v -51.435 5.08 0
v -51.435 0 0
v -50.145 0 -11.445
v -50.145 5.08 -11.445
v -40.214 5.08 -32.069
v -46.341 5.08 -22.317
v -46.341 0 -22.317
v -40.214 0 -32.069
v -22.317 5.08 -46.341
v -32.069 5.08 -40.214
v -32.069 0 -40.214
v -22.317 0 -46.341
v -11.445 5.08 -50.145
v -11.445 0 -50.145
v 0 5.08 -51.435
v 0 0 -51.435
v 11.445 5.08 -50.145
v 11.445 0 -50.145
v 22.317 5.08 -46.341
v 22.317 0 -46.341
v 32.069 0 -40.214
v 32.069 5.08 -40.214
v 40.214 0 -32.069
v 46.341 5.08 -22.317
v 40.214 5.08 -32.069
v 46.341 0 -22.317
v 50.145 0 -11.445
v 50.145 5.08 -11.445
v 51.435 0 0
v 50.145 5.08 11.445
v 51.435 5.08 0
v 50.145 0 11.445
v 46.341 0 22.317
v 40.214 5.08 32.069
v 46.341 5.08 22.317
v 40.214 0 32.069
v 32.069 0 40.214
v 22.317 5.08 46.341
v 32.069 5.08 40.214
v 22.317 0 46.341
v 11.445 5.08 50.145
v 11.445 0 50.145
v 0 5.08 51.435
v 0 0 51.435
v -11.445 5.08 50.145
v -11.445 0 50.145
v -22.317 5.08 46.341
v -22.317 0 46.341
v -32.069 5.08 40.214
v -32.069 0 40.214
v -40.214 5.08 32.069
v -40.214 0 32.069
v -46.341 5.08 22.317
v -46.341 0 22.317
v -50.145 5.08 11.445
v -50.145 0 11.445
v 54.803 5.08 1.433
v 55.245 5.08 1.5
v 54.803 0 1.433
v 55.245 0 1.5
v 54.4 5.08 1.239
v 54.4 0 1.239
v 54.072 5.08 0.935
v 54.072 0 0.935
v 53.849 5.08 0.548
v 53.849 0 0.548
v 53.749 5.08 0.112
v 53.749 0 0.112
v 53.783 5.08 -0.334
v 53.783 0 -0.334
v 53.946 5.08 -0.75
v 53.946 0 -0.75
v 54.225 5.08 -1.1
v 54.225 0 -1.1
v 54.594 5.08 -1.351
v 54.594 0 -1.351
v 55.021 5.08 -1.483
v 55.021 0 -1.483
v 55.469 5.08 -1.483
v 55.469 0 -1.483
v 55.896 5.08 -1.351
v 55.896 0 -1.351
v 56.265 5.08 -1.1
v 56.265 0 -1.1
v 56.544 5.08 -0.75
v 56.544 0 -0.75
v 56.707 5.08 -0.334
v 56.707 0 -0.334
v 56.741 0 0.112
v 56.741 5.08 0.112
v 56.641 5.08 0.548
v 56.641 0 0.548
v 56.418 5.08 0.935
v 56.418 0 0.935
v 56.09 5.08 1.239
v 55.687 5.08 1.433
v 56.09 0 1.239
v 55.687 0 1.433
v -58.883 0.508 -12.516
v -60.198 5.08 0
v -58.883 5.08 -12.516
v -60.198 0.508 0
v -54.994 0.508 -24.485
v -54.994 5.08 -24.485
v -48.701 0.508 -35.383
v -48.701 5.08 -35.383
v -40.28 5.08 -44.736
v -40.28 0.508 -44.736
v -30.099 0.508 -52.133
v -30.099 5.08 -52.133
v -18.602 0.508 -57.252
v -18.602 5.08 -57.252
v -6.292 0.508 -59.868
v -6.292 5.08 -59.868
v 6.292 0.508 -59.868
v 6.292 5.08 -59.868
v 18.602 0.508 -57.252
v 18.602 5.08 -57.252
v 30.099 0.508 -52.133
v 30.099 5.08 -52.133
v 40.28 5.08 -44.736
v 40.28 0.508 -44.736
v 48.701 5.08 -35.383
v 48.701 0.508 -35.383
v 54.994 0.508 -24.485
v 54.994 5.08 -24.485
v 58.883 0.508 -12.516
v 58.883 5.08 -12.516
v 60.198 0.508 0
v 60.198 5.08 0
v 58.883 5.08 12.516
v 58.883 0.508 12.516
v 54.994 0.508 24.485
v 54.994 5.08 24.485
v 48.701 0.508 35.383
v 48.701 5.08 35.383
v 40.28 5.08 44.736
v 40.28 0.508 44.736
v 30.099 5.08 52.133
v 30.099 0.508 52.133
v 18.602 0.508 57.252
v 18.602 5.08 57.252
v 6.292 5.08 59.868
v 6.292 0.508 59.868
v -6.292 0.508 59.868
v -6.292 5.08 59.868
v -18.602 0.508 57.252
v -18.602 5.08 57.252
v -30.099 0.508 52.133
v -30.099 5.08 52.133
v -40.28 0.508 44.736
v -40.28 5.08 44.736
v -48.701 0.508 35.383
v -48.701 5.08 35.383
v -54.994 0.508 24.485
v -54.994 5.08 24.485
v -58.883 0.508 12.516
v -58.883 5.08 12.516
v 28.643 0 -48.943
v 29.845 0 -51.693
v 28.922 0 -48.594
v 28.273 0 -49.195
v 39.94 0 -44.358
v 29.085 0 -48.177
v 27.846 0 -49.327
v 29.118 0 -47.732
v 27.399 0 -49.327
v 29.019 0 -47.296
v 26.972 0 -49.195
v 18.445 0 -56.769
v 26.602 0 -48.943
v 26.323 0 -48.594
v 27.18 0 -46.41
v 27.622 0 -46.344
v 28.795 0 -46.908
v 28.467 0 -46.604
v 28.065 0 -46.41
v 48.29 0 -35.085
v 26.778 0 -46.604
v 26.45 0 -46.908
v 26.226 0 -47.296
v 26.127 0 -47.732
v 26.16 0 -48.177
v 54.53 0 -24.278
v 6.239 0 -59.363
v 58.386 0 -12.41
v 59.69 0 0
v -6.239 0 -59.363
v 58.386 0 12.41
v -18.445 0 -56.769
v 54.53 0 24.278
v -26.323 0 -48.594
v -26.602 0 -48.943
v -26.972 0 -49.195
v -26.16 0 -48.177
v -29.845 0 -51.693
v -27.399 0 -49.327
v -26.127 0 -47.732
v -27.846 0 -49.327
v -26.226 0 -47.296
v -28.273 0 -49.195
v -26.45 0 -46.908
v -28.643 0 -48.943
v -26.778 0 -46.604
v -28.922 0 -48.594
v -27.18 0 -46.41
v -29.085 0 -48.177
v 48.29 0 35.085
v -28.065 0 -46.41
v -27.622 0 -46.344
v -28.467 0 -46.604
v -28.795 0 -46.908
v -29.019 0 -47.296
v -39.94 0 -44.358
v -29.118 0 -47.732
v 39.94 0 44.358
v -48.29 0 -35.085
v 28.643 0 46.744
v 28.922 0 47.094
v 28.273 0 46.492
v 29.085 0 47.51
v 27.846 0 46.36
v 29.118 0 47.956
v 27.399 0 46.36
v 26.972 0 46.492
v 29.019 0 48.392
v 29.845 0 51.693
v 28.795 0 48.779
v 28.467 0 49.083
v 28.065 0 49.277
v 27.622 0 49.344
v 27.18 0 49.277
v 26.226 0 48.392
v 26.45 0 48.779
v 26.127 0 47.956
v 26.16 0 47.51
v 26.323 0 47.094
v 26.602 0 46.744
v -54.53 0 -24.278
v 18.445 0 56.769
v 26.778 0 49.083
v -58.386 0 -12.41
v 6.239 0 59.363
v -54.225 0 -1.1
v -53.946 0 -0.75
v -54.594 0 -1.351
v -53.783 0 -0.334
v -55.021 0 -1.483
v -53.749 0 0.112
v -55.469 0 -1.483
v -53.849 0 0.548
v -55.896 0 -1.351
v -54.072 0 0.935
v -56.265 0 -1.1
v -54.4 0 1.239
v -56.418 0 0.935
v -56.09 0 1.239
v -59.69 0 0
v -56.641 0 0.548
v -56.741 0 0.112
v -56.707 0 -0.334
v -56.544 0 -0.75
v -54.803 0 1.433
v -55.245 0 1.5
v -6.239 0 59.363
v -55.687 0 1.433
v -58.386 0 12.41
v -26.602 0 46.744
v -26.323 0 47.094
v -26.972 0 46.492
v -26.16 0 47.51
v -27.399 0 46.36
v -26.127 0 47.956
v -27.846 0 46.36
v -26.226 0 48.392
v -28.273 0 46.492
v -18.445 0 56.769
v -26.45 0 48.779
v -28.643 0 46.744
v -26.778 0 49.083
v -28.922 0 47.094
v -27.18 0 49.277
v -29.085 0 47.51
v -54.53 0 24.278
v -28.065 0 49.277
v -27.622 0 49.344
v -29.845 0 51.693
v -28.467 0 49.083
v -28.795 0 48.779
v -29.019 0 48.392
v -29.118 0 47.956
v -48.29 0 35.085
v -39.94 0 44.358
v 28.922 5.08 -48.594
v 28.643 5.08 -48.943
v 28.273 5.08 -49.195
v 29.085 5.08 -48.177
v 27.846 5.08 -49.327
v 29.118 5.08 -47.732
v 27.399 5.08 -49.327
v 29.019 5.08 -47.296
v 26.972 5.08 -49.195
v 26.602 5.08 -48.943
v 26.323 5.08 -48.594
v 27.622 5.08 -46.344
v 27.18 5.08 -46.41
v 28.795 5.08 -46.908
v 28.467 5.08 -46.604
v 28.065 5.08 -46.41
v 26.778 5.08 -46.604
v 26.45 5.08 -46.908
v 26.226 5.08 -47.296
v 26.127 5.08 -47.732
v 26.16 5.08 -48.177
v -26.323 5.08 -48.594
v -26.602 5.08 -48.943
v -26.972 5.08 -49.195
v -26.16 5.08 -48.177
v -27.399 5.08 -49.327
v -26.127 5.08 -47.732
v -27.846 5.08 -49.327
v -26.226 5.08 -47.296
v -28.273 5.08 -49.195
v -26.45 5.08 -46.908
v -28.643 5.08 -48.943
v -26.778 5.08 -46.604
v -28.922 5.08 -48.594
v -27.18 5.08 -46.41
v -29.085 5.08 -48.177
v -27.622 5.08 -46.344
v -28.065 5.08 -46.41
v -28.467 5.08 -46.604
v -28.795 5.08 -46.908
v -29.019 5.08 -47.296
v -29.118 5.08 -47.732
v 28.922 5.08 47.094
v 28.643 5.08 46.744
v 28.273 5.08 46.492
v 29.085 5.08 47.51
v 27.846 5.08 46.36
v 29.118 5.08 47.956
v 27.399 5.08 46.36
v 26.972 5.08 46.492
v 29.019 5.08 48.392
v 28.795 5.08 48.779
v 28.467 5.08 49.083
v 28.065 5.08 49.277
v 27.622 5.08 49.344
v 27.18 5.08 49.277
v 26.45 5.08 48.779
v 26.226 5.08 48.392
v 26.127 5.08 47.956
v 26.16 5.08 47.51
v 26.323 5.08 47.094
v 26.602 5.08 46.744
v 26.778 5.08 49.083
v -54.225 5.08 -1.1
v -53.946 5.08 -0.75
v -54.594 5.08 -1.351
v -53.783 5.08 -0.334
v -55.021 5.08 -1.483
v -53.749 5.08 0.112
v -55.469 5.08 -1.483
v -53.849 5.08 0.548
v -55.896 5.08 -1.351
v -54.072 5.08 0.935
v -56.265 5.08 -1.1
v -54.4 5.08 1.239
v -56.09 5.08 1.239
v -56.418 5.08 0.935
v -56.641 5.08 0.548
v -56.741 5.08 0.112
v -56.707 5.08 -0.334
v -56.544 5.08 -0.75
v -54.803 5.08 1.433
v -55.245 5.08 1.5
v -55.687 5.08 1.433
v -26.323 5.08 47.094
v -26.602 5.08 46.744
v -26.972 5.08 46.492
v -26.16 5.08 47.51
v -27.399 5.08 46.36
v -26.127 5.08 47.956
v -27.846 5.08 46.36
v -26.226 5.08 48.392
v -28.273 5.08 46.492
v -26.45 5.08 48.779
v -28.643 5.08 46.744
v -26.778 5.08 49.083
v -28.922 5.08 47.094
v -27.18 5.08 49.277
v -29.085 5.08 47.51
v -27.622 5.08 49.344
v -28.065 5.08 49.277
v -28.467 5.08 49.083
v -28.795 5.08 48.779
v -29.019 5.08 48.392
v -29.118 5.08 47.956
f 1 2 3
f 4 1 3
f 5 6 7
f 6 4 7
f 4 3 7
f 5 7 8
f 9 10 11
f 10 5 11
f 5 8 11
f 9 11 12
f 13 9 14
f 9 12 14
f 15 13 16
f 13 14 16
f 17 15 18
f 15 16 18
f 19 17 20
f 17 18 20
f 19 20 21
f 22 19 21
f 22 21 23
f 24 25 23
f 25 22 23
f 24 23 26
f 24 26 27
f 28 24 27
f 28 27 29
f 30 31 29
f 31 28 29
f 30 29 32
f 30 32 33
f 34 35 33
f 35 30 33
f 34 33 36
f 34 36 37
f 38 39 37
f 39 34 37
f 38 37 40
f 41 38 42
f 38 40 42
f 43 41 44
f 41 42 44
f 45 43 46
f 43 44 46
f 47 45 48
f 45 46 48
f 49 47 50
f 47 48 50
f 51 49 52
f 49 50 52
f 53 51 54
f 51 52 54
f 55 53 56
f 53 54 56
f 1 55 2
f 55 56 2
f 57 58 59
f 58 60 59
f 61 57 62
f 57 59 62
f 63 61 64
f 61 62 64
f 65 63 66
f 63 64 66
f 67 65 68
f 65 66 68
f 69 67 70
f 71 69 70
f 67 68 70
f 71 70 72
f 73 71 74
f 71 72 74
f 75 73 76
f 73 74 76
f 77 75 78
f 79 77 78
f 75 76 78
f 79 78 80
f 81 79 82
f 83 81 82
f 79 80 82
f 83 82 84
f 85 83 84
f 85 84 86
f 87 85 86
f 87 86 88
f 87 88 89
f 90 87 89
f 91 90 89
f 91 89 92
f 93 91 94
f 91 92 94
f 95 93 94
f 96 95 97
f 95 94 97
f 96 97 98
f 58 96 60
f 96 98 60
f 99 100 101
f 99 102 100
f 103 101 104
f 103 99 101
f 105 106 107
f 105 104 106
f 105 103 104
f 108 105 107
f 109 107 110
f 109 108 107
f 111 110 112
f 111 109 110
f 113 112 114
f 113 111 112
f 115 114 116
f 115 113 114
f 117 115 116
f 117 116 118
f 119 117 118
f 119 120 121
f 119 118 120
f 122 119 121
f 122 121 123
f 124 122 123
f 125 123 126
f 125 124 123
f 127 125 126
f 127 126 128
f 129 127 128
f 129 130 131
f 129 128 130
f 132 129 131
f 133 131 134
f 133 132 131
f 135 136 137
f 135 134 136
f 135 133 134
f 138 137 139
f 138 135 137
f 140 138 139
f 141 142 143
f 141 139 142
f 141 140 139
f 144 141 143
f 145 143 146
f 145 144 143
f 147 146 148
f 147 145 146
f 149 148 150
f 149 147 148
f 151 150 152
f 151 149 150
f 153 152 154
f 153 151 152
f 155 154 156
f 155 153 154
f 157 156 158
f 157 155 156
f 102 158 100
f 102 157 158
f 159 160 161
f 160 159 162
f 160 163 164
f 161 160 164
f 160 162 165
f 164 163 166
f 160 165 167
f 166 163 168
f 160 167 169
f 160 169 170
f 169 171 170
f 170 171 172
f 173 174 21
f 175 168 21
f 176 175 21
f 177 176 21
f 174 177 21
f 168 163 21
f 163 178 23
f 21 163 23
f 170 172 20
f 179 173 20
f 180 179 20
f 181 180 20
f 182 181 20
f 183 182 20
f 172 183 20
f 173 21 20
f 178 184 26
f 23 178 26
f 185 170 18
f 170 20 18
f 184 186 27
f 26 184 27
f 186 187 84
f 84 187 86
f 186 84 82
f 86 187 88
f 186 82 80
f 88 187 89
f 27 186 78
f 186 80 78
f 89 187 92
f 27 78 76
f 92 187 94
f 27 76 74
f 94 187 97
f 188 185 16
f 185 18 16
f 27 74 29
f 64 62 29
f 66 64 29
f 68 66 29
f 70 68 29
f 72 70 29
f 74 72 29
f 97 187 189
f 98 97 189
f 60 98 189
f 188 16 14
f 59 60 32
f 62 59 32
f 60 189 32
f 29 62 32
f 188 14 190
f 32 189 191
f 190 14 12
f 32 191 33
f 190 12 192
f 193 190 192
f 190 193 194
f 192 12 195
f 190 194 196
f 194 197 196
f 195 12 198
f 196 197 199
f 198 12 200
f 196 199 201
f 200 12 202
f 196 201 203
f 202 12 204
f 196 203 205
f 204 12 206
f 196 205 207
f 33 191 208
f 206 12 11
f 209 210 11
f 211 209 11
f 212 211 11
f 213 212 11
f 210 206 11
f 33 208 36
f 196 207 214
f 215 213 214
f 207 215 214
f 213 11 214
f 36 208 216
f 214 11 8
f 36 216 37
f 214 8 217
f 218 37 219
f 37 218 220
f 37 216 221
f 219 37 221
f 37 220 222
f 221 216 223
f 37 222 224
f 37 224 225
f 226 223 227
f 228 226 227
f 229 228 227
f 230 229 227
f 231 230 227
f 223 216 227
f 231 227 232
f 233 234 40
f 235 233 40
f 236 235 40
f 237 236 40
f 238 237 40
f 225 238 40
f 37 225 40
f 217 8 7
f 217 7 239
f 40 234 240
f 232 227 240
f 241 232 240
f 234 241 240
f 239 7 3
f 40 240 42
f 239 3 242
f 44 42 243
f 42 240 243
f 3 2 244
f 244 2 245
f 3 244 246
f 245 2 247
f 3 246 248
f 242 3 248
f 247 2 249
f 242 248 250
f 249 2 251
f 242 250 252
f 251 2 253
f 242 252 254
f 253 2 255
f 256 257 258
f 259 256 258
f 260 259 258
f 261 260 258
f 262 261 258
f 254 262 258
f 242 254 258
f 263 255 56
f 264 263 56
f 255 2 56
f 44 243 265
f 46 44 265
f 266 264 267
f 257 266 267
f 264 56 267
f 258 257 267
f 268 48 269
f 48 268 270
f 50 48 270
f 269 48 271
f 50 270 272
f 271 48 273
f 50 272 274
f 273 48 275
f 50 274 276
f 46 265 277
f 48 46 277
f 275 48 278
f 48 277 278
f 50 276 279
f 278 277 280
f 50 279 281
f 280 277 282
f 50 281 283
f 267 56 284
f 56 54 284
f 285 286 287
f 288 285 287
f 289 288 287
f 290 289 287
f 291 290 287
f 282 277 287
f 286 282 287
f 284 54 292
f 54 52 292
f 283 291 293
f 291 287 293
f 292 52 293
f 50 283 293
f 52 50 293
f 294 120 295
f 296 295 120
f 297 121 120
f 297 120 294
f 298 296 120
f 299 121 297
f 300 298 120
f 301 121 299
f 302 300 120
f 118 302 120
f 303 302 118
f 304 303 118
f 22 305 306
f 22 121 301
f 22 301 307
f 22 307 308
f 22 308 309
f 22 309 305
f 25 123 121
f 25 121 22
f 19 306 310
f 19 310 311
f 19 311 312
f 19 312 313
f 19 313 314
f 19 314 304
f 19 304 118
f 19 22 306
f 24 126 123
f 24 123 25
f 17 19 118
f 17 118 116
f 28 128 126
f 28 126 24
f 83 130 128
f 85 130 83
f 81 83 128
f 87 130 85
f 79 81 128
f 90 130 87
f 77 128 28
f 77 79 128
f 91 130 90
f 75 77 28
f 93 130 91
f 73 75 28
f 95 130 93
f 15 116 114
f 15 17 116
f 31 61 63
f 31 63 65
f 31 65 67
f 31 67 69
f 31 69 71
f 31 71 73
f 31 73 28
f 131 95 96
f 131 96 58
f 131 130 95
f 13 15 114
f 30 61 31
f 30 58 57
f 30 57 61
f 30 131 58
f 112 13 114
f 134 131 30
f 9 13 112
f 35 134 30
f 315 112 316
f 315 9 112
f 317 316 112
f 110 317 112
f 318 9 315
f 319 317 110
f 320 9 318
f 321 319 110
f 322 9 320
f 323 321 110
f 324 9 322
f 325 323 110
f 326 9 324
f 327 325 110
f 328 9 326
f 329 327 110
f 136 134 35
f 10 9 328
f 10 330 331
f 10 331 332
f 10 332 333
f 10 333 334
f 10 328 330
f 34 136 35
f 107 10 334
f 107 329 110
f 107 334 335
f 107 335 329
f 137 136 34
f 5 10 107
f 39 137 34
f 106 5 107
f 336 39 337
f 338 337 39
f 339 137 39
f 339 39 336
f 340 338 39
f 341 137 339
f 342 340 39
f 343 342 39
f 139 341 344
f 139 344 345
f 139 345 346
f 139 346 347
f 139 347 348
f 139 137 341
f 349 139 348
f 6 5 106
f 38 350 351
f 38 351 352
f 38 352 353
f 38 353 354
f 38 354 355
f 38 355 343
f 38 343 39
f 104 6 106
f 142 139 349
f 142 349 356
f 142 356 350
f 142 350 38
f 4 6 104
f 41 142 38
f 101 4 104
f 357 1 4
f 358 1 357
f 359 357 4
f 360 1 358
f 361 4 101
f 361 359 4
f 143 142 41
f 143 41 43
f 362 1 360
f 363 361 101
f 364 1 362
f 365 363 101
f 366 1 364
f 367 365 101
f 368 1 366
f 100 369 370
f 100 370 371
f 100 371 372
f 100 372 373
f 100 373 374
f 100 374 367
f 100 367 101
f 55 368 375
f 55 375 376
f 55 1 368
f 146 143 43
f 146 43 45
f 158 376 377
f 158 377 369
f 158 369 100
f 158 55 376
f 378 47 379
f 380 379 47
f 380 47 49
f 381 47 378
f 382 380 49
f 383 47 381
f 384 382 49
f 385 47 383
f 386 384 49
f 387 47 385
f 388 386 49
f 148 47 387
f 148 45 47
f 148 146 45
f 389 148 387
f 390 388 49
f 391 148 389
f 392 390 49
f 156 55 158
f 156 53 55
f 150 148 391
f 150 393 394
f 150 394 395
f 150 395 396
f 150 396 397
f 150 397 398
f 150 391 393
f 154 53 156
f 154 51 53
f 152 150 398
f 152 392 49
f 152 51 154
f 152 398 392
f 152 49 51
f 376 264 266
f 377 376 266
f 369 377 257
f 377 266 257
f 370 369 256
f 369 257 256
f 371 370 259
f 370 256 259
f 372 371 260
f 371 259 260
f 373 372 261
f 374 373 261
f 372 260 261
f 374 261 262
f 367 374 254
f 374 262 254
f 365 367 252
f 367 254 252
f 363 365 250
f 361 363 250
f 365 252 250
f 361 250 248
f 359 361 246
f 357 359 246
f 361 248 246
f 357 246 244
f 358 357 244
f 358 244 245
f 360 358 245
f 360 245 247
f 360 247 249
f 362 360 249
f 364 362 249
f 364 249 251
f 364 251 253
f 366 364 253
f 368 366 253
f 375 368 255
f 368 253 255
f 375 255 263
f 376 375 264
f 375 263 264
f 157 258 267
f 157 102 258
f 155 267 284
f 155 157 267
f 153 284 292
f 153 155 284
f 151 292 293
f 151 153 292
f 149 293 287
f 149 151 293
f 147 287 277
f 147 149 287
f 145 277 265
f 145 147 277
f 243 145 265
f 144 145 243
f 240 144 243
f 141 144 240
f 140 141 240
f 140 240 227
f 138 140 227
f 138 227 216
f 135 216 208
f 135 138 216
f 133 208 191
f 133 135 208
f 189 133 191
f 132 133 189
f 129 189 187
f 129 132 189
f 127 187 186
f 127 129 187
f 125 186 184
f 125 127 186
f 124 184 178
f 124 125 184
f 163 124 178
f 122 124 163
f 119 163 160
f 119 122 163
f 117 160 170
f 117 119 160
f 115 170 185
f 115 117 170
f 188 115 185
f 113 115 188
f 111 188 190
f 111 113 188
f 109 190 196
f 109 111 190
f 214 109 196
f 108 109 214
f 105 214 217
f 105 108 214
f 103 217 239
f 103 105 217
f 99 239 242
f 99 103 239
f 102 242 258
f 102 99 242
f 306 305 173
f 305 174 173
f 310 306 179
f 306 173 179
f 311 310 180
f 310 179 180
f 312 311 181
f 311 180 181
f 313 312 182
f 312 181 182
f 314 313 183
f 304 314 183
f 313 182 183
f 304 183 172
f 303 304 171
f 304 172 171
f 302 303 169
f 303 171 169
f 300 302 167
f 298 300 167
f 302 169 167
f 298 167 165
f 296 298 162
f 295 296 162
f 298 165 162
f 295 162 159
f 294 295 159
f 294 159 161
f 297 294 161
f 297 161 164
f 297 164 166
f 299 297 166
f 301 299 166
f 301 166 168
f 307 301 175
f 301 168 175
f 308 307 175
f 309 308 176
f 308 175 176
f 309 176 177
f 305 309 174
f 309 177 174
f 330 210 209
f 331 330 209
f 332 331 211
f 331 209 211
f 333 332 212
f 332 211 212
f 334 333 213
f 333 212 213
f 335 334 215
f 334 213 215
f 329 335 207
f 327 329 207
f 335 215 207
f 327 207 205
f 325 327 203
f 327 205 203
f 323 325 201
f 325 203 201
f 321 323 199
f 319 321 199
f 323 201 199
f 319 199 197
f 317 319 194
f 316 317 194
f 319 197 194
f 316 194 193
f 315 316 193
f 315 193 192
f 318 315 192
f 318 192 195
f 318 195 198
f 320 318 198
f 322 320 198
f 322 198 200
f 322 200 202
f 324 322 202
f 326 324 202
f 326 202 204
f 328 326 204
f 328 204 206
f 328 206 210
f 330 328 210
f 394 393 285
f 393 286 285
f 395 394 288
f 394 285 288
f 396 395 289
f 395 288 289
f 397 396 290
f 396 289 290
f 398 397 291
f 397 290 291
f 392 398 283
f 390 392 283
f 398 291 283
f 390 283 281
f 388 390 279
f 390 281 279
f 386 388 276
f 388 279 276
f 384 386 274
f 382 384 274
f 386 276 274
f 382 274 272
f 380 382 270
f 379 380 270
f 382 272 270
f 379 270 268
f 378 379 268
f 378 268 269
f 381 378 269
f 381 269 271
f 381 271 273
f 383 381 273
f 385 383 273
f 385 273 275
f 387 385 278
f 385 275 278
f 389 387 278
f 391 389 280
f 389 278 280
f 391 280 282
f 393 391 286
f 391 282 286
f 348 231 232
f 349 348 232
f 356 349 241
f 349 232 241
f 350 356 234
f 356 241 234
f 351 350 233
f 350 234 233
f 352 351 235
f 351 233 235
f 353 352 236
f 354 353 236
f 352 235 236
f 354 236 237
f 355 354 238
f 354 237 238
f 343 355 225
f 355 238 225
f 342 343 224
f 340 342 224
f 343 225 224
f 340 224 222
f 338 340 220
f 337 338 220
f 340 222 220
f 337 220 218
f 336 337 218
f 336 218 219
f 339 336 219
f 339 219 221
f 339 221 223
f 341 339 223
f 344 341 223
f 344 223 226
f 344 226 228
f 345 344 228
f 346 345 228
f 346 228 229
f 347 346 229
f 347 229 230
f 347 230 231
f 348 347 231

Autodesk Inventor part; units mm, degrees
ref_plane "YZ Plane" through (0, 0, 0) normal (1, 0, 0) x (0, 1, 0)
ref_plane "XZ Plane" through (0, 0, 0) normal (0, 1, 0) x (-1, 0, 0)
ref_plane "XY Plane" through (0, 0, 0) normal (0, 0, 1) x (1, 0, 0)
sketch "Sketch1" plane through (0, 0, 0) normal (0, 1, 0) x (-1, 0, 0)
  circle A0 centre (0, 0) radius 51.435
  circle A1 centre (0, 0) radius 60.198
  dimension "d0" = 102.87
  dimension "d1" = 120.396
extrude "Extrusion1" add sketch "Sketch1" along normal blind 5.08
sketch "Sketch2" plane through (0, 5.08, 0) normal (0, 1, 0) x (1, 0, 0)
  circle A0 centre (0, 0) radius 55.245
  point P0 (-55.245, 0)
  point P1 (-27.6225, -47.8436)
  point P2 (27.6225, -47.8436)
  point P3 (55.245, 0)
  point P4 (27.6225, 47.8436)
  point P5 (-27.6225, 47.8436)
  dimension "d4" = 110.49
  dimension "d8" = 360
hole "Hole1" at (-55.245, 5.08, 0) at (-27.6225, 5.08, 47.8436) at (27.6225, 5.08, 47.8436) at (55.245, 5.08, 0) at (27.6225, 5.08, -47.8436) at (-27.6225, 5.08, -47.8436) direction (0, -1, 0) diameter 3 end through all
chamfer "Chamfer1" distance 0.508 angle 45 1 edges at (60.198, 0, 0)
properties part number "Oring Fitting Dome V2 -part"
